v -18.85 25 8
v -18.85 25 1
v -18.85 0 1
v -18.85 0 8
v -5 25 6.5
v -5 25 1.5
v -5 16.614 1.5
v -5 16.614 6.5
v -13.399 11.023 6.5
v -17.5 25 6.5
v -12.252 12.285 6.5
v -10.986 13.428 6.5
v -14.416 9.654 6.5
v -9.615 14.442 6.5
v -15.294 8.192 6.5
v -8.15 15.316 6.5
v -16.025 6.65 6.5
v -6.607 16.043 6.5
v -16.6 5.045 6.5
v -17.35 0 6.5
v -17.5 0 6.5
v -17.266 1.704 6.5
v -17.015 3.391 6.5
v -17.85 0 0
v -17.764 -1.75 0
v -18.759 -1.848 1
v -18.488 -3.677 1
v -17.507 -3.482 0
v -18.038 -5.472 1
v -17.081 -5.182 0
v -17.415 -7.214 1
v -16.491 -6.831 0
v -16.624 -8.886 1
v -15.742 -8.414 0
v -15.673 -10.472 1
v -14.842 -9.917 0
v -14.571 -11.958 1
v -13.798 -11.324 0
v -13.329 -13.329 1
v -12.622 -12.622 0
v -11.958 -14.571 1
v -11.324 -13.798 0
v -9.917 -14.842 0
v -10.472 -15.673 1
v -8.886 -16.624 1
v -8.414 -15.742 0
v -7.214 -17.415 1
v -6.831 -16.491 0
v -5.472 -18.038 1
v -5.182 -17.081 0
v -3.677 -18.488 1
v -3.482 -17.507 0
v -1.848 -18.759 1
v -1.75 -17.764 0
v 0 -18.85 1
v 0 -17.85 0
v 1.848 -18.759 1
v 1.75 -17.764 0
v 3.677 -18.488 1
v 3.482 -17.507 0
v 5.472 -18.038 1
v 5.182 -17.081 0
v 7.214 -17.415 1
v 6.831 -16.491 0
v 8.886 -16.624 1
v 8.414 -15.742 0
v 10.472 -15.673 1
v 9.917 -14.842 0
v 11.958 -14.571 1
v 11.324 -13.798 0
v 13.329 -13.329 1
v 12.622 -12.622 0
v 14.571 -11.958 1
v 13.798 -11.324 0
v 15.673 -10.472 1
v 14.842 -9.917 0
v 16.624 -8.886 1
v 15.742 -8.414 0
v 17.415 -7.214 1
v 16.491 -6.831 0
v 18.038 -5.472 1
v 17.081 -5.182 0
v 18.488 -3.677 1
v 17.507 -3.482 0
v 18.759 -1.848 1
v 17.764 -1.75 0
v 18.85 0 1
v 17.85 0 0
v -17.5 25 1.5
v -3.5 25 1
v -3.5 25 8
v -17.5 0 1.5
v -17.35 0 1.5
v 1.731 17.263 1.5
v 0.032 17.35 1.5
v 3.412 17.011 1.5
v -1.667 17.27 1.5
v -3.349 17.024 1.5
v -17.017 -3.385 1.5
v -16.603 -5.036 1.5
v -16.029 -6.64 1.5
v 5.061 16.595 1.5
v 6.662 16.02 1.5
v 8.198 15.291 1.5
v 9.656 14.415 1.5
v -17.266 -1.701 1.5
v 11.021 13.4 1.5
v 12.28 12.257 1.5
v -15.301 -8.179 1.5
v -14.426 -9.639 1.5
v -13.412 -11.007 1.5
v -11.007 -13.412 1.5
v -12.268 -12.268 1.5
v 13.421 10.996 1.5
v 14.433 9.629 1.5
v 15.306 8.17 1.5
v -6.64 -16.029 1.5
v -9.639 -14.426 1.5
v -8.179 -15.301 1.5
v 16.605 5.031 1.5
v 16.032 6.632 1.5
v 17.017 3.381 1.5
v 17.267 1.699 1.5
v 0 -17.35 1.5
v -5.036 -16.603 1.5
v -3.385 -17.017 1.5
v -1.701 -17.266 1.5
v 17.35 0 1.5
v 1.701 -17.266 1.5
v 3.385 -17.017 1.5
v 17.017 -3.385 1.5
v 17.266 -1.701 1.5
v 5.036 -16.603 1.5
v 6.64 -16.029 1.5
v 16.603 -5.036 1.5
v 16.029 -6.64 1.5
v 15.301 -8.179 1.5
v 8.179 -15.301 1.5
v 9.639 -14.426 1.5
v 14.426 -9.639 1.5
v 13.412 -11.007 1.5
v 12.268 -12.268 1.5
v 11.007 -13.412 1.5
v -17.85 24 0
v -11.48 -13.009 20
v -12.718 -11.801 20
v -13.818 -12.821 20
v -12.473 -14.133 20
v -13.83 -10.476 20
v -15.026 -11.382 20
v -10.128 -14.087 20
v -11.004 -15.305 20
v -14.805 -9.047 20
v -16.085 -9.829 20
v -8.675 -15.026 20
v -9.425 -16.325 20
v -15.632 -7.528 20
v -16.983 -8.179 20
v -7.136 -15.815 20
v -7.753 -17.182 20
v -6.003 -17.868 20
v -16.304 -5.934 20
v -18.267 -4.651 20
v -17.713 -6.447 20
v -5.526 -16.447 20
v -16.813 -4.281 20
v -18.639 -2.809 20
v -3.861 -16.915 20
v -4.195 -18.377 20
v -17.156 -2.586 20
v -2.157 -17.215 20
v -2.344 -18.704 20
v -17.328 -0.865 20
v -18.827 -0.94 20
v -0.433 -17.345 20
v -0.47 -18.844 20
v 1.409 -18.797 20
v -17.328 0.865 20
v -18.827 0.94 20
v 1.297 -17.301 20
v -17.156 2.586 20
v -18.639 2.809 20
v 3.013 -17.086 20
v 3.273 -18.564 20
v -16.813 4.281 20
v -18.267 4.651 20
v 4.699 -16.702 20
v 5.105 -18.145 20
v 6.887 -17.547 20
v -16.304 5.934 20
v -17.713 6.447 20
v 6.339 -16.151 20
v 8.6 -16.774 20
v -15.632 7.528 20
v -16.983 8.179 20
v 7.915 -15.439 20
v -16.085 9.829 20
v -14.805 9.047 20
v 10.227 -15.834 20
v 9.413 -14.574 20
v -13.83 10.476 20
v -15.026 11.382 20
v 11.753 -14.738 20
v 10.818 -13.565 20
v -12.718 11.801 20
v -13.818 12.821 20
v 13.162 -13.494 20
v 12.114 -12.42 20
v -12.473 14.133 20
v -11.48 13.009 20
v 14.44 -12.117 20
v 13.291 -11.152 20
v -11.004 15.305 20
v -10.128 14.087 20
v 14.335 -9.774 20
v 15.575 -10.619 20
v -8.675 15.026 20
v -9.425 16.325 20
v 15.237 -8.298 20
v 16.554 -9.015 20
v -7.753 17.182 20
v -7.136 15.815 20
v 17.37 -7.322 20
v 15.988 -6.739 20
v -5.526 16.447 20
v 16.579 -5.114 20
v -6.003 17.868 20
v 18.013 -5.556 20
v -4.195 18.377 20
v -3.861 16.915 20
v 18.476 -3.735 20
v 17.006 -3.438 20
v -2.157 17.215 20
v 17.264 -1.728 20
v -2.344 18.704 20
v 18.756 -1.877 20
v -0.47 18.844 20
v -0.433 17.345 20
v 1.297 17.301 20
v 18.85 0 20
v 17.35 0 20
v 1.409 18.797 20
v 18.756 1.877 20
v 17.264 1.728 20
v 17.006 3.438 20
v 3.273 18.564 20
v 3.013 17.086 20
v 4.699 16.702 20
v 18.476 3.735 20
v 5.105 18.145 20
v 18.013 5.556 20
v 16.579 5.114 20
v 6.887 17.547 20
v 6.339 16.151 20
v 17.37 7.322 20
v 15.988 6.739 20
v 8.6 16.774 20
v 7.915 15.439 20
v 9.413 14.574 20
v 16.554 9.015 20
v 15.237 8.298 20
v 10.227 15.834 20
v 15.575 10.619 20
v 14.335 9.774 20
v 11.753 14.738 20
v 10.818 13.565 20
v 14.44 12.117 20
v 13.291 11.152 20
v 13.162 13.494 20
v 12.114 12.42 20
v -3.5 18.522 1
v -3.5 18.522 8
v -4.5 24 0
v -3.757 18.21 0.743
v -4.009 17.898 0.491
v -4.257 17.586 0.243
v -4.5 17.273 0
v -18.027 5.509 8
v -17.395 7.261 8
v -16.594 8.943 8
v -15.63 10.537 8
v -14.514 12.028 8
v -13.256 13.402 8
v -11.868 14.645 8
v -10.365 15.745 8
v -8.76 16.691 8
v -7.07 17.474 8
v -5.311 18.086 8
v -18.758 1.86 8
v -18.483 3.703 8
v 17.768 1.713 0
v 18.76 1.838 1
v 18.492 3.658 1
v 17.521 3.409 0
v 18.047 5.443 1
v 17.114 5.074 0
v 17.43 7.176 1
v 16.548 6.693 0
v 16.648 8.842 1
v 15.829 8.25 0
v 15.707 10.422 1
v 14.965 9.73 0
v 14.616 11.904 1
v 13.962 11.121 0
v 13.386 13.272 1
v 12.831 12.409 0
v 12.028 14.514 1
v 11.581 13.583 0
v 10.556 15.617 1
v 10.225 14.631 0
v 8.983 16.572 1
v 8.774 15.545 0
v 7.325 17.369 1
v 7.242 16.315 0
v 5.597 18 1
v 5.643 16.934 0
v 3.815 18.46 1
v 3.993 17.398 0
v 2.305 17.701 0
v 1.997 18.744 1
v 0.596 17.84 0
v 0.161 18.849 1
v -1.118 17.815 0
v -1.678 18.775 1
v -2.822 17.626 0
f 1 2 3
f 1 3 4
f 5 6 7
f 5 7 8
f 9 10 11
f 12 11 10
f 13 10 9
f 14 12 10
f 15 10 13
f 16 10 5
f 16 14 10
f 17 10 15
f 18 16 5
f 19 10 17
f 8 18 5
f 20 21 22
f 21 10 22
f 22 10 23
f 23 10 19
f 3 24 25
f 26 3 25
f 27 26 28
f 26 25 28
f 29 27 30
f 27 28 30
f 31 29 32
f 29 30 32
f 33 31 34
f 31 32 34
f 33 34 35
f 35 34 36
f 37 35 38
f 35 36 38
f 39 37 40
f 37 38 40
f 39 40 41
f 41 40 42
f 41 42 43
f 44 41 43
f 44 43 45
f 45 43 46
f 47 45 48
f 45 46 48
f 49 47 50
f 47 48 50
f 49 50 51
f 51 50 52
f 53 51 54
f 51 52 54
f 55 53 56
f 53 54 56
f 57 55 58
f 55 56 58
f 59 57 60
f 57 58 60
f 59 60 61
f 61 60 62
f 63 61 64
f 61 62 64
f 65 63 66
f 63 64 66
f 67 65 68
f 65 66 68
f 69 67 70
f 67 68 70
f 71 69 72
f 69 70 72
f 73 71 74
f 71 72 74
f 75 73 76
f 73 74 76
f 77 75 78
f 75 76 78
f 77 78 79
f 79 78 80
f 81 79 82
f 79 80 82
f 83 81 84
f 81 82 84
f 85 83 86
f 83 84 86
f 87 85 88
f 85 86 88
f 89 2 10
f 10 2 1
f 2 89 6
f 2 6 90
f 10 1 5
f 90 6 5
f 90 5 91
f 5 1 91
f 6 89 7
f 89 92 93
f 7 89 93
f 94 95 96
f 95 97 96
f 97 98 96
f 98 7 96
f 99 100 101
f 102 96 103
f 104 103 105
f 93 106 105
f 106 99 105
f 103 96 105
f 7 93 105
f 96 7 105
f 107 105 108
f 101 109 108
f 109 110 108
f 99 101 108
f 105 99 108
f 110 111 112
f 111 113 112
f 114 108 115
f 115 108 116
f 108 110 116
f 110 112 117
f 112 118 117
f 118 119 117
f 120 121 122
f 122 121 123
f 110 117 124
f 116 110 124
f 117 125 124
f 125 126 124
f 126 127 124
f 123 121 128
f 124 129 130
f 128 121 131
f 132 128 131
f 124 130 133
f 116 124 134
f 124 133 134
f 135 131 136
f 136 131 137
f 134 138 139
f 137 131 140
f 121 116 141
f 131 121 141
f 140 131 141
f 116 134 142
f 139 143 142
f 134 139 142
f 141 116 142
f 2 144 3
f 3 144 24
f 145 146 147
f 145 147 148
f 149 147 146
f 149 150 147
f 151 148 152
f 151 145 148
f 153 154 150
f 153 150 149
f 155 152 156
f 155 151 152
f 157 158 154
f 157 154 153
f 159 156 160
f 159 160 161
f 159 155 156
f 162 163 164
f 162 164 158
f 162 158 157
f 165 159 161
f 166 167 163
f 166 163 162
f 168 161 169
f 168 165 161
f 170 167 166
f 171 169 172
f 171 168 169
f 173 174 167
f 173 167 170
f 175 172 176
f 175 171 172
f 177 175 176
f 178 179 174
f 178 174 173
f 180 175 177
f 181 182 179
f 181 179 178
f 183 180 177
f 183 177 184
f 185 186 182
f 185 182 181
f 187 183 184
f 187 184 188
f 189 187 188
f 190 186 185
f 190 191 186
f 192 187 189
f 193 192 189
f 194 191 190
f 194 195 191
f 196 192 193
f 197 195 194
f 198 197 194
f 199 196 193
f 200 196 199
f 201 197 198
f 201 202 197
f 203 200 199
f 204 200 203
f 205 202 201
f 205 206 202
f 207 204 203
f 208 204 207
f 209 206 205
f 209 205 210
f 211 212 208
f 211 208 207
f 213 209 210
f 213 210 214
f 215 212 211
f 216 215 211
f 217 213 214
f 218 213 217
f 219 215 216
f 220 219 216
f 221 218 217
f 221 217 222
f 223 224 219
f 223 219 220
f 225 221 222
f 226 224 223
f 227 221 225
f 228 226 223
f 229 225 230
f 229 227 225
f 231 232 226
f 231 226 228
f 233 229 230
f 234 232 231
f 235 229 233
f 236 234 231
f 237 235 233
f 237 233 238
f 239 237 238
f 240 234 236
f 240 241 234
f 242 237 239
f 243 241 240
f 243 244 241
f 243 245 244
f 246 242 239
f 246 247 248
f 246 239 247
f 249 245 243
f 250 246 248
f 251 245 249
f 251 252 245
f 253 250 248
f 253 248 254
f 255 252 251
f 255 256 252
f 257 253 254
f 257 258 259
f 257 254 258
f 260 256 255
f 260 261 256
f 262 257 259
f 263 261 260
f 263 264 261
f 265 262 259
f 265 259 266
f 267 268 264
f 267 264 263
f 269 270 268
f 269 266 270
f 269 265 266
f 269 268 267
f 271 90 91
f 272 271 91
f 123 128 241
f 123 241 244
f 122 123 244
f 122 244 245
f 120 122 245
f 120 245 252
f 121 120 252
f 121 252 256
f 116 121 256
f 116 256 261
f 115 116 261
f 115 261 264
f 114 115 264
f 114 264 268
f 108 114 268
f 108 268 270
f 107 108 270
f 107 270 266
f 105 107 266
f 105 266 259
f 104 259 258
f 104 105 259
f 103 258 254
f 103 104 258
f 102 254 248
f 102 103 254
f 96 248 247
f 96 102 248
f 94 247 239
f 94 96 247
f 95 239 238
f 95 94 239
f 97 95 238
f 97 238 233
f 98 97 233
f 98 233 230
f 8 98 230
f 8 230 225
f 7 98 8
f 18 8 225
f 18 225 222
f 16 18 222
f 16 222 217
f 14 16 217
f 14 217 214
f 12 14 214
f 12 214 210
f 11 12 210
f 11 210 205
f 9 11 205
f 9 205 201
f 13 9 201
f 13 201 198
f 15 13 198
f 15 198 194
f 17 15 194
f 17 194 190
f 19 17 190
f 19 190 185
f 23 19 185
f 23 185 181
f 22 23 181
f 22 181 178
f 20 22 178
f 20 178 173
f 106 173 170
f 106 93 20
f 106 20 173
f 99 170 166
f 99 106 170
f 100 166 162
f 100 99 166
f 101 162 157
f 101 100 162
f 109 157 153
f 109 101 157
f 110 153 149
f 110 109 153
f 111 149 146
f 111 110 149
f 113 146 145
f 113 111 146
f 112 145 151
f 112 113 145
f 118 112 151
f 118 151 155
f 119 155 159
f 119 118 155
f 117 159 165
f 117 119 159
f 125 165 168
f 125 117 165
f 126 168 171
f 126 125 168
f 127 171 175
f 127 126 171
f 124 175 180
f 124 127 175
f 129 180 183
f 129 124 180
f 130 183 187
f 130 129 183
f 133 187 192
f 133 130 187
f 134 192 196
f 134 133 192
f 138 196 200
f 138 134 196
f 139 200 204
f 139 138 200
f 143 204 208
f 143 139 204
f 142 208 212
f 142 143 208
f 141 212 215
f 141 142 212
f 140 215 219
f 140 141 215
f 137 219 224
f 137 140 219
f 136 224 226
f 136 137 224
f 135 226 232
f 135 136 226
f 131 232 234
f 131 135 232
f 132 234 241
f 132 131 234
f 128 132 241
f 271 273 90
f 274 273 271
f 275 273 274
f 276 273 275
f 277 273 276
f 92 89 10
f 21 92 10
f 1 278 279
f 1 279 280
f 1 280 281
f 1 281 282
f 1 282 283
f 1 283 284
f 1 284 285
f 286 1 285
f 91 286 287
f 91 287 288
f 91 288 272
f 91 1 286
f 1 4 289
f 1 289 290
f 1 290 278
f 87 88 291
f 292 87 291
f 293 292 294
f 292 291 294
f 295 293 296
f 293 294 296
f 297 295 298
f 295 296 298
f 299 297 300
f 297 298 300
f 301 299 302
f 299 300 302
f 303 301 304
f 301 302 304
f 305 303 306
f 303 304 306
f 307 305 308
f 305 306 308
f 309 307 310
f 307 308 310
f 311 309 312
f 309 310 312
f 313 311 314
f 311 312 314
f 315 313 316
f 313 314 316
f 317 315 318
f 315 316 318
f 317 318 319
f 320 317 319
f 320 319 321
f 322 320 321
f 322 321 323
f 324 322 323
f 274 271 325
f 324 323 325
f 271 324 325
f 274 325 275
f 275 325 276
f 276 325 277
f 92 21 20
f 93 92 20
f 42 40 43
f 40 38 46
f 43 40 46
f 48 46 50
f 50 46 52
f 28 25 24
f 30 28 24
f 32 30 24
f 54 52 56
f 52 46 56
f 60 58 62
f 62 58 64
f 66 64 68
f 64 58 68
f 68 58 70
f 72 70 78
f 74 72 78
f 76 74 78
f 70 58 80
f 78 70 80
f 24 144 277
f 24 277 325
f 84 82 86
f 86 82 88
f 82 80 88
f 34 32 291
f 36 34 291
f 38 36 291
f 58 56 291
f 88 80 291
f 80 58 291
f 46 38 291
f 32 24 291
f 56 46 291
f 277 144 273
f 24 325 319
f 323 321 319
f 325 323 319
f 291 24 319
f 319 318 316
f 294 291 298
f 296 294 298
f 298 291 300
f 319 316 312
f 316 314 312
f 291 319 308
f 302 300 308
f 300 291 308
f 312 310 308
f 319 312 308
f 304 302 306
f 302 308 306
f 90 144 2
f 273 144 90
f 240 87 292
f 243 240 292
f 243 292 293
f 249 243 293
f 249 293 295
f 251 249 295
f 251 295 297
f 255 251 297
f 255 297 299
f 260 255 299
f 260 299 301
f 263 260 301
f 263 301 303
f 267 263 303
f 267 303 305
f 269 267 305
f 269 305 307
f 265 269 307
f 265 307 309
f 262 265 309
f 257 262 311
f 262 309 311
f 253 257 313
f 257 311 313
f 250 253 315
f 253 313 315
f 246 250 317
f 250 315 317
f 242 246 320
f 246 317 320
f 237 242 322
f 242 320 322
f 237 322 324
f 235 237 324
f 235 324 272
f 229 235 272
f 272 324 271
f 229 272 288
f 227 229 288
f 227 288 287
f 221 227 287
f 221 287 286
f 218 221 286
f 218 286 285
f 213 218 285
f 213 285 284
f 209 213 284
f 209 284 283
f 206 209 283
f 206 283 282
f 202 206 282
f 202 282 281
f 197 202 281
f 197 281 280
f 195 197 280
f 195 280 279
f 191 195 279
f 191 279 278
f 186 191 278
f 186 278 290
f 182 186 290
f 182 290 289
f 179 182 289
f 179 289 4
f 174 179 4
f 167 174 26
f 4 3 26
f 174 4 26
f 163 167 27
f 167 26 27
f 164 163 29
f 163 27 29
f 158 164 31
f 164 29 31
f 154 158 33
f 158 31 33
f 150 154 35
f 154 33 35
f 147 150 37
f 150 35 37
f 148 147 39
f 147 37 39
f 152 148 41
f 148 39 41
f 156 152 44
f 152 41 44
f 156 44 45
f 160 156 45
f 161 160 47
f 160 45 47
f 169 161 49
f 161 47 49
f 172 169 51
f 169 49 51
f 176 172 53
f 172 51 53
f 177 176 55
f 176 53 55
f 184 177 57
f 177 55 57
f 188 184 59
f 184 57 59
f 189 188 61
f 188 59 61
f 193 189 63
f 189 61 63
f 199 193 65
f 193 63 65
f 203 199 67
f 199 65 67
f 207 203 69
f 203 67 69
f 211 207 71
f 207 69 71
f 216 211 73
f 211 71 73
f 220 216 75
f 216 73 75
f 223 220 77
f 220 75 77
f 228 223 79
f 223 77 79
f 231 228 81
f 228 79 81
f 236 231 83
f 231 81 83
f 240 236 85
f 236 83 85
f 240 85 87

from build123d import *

# Parameters (mm, degrees)
F0_R     = 17.35
F1_DEPTH = 1.5
F0_R_2   = 18.85
F2_DEPTH = 20
F3_W     = 12.5
F3_H     = 5
F4_DEPTH = 25
F6_W     = 15.35
F6_H     = 8
F6_W_2   = 12.5
F6_H_2   = 5
F8_SIZE  = 1


with BuildPart() as f1:
    # F0 (on Top) → F1 (new body)
    with BuildSketch(Plane.XY):
        Circle(F0_R)
    extrude(amount=F1_DEPTH)

    # F0 (on Top) → F2 (join)
    with BuildSketch(Plane.XY):
        Circle(F0_R_2)
        Circle(F0_R, mode=Mode.SUBTRACT)
    extrude(amount=F2_DEPTH)

    # F3 (on Front) → F4 (cut)
    with BuildSketch(Plane.XZ):
        with Locations((-11.25, 4)):
            Rectangle(F3_W, F3_H)
    extrude(amount=-F4_DEPTH, mode=Mode.SUBTRACT)

    # F6 (on offset) → F7 (join, up to the next surface of F1)
    with BuildSketch(Plane.XZ.offset(-25)):
        with Locations((-11.175, 4)):
            Rectangle(F6_W, F6_H)
        with Locations((-11.25, 4)):
            Rectangle(F6_W_2, F6_H_2, mode=Mode.SUBTRACT)
    extrude(until=Until.NEXT)

    # F8
    f8_edges = [f1.edges().sort_by_distance(p)[0] for p in [
        (12.02804, 14.513743, 0),
        (-3.5, 21.761108, 0),
        (-11.175, 25, 0),
        (-18.85, 12.5, 0),
        (0, -18.85, 0),
    ]]
    chamfer(f8_edges, length=F8_SIZE)


solid = f1.part
